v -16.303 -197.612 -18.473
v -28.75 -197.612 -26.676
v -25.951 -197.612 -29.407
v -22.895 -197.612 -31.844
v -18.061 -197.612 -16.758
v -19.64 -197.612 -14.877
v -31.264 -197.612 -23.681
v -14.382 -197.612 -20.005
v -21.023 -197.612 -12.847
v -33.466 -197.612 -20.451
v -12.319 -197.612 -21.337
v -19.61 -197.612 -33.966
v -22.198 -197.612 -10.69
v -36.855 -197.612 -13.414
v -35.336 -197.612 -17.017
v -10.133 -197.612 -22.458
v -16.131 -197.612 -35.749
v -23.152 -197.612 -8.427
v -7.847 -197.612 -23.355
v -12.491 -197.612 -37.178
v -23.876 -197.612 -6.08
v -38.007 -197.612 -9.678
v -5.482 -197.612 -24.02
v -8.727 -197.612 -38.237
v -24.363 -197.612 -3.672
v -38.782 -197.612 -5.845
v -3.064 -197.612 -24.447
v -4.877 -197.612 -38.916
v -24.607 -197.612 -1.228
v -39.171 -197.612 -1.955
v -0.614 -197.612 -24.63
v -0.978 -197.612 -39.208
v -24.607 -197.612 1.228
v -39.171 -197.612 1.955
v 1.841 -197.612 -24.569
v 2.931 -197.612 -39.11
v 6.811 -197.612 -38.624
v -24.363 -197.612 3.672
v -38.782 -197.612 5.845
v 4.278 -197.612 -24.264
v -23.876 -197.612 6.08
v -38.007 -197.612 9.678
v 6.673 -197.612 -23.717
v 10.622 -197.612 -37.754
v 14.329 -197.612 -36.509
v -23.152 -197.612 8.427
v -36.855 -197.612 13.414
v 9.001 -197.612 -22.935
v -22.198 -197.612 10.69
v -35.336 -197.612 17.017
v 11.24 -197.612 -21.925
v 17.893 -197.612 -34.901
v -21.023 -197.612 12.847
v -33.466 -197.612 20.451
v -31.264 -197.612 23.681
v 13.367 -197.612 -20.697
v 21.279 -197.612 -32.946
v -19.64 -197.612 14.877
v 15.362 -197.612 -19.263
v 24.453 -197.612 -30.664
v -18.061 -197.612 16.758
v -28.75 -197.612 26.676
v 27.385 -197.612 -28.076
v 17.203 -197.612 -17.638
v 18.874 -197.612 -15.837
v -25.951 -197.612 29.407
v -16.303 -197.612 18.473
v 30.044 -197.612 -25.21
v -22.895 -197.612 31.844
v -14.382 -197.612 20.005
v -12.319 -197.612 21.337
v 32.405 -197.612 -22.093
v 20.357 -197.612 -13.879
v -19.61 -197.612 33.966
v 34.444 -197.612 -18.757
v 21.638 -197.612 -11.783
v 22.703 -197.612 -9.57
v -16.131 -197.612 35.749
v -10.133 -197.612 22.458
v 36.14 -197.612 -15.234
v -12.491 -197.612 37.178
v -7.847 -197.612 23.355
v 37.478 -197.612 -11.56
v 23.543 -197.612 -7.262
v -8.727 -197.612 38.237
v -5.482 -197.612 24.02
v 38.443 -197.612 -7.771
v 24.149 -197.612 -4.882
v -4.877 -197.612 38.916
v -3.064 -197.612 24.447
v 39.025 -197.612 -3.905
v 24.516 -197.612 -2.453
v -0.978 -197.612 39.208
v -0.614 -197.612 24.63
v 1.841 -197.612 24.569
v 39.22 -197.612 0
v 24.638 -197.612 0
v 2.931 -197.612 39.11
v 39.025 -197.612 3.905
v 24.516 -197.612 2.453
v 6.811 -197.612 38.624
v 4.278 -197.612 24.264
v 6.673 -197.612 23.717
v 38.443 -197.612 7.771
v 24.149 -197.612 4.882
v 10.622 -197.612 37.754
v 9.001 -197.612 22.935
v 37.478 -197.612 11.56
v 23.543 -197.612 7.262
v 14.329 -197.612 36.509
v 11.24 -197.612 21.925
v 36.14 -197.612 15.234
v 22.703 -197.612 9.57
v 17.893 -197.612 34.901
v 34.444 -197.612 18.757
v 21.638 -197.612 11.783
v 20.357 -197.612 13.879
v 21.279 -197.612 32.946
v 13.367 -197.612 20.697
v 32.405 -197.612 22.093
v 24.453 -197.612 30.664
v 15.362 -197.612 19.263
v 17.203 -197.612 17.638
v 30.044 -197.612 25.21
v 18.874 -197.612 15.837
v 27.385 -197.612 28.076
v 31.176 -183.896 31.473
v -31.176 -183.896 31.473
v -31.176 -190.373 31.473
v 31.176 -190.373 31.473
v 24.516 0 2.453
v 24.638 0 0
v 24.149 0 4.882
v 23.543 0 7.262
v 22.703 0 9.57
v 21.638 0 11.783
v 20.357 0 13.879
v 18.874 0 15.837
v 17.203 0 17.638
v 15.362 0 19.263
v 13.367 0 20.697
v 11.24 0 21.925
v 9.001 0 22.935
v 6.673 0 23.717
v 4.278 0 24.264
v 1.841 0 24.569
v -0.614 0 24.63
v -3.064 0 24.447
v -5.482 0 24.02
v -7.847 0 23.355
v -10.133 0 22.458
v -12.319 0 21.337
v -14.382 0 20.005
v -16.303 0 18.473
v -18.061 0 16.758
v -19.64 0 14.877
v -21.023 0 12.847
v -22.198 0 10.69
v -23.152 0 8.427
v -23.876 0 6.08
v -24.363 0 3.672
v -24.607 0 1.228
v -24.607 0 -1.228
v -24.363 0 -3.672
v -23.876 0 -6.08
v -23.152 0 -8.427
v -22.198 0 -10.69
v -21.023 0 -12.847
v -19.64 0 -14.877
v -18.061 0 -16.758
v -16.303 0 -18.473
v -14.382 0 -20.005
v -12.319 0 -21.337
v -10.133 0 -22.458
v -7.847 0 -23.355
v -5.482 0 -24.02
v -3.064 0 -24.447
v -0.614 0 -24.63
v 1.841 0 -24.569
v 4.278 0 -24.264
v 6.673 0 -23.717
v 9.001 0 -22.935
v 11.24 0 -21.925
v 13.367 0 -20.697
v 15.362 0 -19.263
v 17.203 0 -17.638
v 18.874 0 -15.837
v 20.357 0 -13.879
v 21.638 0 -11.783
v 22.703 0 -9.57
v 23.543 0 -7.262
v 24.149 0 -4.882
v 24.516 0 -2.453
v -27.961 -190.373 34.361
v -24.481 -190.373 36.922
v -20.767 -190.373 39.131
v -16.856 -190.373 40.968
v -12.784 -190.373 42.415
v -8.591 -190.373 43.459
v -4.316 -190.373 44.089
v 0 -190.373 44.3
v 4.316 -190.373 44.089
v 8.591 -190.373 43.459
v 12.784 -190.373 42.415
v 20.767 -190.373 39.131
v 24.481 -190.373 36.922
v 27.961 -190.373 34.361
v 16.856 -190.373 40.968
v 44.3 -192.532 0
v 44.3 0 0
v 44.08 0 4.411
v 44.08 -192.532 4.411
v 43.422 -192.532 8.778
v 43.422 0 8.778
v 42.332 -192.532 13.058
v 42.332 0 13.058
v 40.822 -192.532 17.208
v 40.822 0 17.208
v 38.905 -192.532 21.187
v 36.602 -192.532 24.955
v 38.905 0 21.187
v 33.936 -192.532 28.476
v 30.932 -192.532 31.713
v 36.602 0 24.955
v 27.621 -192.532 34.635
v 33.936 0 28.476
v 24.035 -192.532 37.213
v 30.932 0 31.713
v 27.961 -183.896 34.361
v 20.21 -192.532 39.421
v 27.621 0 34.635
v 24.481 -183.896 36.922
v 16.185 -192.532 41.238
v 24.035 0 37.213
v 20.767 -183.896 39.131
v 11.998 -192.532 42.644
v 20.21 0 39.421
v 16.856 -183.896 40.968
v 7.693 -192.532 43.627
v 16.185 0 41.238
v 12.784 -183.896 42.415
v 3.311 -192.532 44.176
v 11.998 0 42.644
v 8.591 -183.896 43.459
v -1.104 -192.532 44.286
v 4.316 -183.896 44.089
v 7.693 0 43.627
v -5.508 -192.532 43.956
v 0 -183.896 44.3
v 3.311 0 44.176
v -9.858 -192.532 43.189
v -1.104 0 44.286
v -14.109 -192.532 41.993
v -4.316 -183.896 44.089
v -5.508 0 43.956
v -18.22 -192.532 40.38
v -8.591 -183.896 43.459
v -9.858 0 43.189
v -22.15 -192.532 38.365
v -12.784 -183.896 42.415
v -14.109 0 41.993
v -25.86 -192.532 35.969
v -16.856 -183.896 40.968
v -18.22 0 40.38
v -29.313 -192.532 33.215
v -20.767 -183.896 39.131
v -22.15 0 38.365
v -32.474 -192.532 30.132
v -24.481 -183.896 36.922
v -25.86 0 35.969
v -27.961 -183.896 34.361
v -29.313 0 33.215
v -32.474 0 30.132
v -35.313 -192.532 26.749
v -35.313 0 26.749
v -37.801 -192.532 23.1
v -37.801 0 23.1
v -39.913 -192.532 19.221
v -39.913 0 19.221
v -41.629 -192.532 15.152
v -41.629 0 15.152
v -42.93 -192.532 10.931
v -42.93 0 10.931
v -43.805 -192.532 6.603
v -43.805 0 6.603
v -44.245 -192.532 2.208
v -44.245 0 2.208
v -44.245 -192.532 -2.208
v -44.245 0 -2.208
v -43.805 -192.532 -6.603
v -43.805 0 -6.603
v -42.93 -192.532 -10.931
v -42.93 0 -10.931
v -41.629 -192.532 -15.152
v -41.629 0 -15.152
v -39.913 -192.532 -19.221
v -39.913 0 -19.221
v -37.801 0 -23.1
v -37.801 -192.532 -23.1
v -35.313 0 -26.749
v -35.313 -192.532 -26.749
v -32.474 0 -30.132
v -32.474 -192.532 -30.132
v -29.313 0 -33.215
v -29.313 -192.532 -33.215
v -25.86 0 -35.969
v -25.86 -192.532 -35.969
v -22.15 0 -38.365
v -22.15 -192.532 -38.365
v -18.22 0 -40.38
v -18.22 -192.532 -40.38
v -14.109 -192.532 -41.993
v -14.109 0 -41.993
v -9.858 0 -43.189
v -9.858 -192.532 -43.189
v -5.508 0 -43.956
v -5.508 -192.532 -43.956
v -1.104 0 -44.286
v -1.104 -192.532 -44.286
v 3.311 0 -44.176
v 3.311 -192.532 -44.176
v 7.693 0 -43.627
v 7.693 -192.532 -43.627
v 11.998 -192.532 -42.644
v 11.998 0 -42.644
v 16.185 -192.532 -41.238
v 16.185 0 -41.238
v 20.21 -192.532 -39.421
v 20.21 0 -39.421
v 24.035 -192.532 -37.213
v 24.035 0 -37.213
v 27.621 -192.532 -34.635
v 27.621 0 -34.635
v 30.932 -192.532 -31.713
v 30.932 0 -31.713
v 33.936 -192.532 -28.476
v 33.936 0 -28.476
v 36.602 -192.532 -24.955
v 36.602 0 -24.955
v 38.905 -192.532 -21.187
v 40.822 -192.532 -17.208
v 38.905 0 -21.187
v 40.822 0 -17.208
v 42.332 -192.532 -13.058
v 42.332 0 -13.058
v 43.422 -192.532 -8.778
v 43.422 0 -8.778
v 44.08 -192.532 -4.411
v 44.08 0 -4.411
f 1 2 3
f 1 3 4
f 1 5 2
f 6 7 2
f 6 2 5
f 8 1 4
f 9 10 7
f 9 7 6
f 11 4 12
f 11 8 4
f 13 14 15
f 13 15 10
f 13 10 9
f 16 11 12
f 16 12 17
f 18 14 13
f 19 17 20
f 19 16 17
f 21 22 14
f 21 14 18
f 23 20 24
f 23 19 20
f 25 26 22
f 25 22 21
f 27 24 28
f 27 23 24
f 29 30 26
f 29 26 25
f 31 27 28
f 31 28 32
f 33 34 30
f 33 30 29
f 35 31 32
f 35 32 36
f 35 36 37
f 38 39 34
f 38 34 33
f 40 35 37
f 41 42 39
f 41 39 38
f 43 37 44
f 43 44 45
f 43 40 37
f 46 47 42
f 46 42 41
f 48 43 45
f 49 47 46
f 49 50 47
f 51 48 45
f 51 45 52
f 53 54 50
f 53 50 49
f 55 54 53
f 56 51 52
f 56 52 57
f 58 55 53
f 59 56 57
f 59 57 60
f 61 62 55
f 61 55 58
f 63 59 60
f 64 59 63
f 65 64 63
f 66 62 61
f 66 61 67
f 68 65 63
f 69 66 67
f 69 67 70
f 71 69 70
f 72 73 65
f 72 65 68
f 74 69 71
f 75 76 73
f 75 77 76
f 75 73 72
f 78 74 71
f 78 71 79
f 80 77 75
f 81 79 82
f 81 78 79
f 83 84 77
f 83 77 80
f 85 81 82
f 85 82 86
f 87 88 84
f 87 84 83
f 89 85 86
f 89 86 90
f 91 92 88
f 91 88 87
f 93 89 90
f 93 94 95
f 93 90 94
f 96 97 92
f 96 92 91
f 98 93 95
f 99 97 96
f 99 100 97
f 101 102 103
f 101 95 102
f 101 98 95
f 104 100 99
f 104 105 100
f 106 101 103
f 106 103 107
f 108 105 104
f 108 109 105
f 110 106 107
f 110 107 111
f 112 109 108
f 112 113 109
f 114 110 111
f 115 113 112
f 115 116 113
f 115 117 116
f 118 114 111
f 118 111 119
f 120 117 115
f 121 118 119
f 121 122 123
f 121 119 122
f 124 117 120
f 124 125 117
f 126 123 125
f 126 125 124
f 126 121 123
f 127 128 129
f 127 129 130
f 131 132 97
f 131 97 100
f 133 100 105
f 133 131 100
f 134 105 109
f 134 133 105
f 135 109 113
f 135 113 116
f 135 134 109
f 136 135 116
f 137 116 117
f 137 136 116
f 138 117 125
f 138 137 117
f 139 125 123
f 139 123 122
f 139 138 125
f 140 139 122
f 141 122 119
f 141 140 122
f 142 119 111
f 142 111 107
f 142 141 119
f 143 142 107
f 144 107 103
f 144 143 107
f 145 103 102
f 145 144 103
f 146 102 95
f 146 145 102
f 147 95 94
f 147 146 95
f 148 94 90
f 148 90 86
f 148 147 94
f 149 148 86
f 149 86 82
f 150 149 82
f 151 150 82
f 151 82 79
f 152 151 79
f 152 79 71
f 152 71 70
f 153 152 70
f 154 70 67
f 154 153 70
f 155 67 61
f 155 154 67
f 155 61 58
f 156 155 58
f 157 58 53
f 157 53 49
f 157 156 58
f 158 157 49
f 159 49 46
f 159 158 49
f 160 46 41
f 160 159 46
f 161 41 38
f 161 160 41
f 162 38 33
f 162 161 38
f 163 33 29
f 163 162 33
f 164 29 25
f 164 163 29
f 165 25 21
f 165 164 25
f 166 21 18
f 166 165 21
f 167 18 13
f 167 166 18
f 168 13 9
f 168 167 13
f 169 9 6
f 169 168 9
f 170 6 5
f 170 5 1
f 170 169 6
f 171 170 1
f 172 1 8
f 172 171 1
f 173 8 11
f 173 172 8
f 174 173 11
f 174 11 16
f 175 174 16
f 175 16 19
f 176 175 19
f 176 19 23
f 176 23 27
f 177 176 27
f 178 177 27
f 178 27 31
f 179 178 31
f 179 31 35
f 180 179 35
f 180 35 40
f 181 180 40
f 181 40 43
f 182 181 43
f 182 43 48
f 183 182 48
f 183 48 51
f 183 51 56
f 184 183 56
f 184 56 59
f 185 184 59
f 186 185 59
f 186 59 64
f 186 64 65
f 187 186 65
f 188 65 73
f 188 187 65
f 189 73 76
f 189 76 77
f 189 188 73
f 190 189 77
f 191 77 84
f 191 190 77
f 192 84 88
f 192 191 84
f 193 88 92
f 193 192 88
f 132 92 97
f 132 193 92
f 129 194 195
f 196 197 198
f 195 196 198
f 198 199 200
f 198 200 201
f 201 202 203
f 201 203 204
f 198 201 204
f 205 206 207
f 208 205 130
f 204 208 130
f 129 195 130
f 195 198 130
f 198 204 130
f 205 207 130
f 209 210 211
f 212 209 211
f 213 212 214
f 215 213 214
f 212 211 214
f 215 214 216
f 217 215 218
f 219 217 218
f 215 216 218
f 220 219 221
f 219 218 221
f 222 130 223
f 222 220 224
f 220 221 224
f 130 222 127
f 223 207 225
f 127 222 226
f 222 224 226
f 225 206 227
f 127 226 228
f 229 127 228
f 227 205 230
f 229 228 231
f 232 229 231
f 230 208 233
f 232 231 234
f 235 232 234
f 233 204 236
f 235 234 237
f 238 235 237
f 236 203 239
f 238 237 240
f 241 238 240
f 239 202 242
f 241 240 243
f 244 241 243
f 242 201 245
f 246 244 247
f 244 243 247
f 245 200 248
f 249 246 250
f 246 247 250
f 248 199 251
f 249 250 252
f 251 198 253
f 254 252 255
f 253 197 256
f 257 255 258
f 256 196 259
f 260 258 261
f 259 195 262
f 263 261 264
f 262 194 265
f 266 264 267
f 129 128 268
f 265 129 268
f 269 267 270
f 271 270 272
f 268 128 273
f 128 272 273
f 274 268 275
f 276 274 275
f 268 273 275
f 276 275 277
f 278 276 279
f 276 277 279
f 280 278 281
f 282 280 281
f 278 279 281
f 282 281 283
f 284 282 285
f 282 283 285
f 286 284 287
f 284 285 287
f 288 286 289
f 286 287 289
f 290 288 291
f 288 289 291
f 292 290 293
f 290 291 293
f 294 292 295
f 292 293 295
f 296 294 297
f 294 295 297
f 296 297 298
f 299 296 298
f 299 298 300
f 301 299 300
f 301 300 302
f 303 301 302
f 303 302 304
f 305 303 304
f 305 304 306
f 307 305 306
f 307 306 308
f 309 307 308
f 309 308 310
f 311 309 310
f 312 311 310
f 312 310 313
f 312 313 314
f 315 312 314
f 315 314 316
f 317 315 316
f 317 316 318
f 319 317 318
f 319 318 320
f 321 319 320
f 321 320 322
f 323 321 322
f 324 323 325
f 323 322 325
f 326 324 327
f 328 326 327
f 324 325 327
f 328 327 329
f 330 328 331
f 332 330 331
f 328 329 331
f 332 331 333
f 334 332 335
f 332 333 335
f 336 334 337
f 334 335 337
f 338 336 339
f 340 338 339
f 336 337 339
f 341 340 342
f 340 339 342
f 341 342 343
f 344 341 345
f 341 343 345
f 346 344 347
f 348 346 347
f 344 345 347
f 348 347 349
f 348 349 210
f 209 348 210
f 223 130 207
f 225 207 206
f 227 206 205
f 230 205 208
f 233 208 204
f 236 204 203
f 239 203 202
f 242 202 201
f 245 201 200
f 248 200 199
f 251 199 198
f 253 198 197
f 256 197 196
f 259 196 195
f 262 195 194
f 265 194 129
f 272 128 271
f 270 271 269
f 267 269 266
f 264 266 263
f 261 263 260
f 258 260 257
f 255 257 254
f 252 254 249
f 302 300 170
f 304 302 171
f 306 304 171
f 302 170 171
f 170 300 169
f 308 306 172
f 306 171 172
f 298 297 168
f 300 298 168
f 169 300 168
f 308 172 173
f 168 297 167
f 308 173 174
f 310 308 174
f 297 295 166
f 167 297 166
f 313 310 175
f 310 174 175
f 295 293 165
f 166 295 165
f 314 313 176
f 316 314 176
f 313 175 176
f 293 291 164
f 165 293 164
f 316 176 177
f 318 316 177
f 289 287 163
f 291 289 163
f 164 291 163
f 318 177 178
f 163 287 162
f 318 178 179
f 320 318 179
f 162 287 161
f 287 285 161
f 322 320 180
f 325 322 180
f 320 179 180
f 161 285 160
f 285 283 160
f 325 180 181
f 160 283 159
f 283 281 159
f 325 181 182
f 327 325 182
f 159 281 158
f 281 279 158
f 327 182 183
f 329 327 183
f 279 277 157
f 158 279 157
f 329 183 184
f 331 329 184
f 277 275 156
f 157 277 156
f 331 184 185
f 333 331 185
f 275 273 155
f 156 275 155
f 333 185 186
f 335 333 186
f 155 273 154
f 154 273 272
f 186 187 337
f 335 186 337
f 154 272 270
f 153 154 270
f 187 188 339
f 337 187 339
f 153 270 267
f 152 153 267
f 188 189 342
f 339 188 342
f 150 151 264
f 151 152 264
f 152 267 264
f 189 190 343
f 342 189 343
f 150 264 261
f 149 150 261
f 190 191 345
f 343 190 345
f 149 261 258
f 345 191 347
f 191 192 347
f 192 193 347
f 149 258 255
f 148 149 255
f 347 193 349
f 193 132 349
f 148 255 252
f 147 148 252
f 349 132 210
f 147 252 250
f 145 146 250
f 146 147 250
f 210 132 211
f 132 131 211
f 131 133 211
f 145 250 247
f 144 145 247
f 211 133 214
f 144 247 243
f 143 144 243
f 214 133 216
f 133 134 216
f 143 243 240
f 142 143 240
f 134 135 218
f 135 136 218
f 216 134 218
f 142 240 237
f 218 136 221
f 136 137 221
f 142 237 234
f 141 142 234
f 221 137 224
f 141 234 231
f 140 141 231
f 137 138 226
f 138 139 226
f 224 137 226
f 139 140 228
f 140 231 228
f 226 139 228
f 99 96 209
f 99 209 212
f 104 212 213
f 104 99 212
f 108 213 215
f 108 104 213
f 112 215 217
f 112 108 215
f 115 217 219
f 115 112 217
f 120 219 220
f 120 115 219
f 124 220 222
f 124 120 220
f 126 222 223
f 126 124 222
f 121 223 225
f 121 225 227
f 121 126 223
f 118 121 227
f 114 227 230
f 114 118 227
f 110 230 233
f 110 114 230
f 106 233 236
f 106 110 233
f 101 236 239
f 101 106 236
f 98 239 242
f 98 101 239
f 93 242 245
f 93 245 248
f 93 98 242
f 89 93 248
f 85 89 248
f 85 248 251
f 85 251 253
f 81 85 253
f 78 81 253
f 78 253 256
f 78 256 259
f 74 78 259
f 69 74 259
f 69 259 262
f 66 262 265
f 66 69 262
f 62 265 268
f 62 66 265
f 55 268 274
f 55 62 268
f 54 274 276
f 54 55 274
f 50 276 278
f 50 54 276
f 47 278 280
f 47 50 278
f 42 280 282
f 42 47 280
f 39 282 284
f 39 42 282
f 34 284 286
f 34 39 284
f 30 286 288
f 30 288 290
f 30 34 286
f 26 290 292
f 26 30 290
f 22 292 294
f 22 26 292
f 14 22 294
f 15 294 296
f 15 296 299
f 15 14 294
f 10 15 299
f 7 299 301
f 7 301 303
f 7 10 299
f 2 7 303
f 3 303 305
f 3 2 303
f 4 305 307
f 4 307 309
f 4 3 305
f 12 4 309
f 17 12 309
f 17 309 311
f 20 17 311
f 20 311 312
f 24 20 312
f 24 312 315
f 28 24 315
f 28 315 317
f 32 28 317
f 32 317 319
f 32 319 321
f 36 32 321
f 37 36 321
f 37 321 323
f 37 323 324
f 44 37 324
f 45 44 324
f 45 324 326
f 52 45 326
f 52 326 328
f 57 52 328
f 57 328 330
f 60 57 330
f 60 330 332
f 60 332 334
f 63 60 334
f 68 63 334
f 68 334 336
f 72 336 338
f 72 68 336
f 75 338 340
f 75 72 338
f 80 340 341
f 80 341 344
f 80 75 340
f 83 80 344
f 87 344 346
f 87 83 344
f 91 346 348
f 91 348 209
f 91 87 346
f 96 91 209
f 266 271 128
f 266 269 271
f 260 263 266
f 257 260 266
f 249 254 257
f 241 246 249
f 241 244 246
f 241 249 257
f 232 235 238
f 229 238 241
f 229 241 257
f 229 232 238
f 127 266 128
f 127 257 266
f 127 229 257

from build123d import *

# Parameters (mm, degrees)
F0_R     = 44.30014
F0_R_2   = 24.638
F1_DEPTH = 197.612
F3_W     = 88.9
F3_H     = 6.477
F4_DEPTH = 12.827
F5_SIZE  = 5.08


with BuildPart() as f1:
    # F0 (on Front) → F1 (new body)
    with BuildSketch(Plane.XZ):
        Circle(F0_R)
        Circle(F0_R_2, mode=Mode.SUBTRACT)
    extrude(amount=F1_DEPTH)

    # F3 (on offset) → F4 (cut)
    with BuildSketch(Plane.XY.offset(44.30014)):
        with Locations((0, -187.1345)):
            Rectangle(F3_W, F3_H)
    extrude(amount=-F4_DEPTH, mode=Mode.SUBTRACT)

    # F5
    f5_edges = [f1.edges().sort_by_distance(p)[0] for p in [
        (-44.30014, -197.612, 0),
    ]]
    chamfer(f5_edges, length=F5_SIZE)


solid = f1.part
